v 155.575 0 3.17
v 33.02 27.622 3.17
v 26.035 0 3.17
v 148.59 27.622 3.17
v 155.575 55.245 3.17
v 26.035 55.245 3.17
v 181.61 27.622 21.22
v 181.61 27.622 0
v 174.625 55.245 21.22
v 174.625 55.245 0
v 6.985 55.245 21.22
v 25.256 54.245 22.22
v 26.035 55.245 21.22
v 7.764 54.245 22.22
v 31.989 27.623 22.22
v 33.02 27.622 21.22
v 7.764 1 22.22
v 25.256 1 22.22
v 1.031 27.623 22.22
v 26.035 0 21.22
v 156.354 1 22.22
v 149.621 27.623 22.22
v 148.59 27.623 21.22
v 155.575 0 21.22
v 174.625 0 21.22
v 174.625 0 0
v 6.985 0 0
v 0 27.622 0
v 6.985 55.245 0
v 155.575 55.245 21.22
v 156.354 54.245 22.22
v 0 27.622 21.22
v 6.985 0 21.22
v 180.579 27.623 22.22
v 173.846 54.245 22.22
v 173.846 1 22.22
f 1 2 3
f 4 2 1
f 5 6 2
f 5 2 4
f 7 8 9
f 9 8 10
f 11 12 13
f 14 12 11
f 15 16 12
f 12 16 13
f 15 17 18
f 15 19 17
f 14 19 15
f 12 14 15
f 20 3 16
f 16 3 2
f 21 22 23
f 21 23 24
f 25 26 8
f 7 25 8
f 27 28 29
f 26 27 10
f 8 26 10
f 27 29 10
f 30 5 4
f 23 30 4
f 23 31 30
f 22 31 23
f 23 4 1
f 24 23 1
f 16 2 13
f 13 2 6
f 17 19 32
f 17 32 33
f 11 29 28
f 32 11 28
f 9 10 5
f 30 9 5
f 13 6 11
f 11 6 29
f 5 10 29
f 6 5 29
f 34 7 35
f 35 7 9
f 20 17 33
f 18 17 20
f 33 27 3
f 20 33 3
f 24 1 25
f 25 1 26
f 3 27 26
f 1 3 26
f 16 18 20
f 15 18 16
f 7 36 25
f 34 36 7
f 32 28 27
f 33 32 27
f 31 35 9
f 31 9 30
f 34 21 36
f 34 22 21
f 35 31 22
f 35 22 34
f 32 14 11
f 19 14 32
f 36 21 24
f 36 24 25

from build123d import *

# Parameters (mm, degrees)
EXTRUDE001_DEPTH = 19.05
EXTRUDE_DEPTH    = 3.17
CHAMFER_SIZE     = 1


with BuildPart() as extrude001:
    # Sketch001 (on Face8 of Extrude) → Extrude001 (new body)
    with BuildSketch(Plane.XY.offset(3.17)):
        Polygon((6.985, 55.245), (0, 27.6225), (6.985, 0), (26.035, 0), (33.02, 27.6225), (26.035, 55.245), align=None)
        Polygon((174.625, 55.245), (155.575, 55.245), (148.59, 27.6225), (155.575, 0), (174.625, 0), (181.61, 27.6225), align=None)
    extrude(amount=EXTRUDE001_DEPTH)


with BuildPart() as chamfer_body:
    # Sketch → Extrude (new body)
    with BuildSketch(Plane.XY):
        Polygon((6.985, 0), (174.625, 0), (181.61, 27.6225), (174.625, 55.245), (6.985, 55.245), (0, 27.6225), align=None)
    extrude(amount=EXTRUDE_DEPTH)

    # Fusion: union Extrude001
    add(extrude001.part)

    # Chamfer
    chamfer_edges = [chamfer_body.edges().sort_by_distance(p)[0] for p in [
        (16.51, 0, 22.22),
        (165.1, 0, 22.22),
        (3.4925, 13.81125, 22.22),
        (178.1175, 13.81125, 22.22),
        (29.5275, 13.81125, 22.22),
        (3.4925, 41.43375, 22.22),
        (29.5275, 41.43375, 22.22),
        (16.51, 55.245, 22.22),
        (152.0825, 41.43375, 22.22),
        (152.0825, 13.81125, 22.22),
        (165.1, 55.245, 22.22),
        (178.1175, 41.43375, 22.22),
    ]]
    chamfer(chamfer_edges, length=CHAMFER_SIZE)


solid = chamfer_body.part
